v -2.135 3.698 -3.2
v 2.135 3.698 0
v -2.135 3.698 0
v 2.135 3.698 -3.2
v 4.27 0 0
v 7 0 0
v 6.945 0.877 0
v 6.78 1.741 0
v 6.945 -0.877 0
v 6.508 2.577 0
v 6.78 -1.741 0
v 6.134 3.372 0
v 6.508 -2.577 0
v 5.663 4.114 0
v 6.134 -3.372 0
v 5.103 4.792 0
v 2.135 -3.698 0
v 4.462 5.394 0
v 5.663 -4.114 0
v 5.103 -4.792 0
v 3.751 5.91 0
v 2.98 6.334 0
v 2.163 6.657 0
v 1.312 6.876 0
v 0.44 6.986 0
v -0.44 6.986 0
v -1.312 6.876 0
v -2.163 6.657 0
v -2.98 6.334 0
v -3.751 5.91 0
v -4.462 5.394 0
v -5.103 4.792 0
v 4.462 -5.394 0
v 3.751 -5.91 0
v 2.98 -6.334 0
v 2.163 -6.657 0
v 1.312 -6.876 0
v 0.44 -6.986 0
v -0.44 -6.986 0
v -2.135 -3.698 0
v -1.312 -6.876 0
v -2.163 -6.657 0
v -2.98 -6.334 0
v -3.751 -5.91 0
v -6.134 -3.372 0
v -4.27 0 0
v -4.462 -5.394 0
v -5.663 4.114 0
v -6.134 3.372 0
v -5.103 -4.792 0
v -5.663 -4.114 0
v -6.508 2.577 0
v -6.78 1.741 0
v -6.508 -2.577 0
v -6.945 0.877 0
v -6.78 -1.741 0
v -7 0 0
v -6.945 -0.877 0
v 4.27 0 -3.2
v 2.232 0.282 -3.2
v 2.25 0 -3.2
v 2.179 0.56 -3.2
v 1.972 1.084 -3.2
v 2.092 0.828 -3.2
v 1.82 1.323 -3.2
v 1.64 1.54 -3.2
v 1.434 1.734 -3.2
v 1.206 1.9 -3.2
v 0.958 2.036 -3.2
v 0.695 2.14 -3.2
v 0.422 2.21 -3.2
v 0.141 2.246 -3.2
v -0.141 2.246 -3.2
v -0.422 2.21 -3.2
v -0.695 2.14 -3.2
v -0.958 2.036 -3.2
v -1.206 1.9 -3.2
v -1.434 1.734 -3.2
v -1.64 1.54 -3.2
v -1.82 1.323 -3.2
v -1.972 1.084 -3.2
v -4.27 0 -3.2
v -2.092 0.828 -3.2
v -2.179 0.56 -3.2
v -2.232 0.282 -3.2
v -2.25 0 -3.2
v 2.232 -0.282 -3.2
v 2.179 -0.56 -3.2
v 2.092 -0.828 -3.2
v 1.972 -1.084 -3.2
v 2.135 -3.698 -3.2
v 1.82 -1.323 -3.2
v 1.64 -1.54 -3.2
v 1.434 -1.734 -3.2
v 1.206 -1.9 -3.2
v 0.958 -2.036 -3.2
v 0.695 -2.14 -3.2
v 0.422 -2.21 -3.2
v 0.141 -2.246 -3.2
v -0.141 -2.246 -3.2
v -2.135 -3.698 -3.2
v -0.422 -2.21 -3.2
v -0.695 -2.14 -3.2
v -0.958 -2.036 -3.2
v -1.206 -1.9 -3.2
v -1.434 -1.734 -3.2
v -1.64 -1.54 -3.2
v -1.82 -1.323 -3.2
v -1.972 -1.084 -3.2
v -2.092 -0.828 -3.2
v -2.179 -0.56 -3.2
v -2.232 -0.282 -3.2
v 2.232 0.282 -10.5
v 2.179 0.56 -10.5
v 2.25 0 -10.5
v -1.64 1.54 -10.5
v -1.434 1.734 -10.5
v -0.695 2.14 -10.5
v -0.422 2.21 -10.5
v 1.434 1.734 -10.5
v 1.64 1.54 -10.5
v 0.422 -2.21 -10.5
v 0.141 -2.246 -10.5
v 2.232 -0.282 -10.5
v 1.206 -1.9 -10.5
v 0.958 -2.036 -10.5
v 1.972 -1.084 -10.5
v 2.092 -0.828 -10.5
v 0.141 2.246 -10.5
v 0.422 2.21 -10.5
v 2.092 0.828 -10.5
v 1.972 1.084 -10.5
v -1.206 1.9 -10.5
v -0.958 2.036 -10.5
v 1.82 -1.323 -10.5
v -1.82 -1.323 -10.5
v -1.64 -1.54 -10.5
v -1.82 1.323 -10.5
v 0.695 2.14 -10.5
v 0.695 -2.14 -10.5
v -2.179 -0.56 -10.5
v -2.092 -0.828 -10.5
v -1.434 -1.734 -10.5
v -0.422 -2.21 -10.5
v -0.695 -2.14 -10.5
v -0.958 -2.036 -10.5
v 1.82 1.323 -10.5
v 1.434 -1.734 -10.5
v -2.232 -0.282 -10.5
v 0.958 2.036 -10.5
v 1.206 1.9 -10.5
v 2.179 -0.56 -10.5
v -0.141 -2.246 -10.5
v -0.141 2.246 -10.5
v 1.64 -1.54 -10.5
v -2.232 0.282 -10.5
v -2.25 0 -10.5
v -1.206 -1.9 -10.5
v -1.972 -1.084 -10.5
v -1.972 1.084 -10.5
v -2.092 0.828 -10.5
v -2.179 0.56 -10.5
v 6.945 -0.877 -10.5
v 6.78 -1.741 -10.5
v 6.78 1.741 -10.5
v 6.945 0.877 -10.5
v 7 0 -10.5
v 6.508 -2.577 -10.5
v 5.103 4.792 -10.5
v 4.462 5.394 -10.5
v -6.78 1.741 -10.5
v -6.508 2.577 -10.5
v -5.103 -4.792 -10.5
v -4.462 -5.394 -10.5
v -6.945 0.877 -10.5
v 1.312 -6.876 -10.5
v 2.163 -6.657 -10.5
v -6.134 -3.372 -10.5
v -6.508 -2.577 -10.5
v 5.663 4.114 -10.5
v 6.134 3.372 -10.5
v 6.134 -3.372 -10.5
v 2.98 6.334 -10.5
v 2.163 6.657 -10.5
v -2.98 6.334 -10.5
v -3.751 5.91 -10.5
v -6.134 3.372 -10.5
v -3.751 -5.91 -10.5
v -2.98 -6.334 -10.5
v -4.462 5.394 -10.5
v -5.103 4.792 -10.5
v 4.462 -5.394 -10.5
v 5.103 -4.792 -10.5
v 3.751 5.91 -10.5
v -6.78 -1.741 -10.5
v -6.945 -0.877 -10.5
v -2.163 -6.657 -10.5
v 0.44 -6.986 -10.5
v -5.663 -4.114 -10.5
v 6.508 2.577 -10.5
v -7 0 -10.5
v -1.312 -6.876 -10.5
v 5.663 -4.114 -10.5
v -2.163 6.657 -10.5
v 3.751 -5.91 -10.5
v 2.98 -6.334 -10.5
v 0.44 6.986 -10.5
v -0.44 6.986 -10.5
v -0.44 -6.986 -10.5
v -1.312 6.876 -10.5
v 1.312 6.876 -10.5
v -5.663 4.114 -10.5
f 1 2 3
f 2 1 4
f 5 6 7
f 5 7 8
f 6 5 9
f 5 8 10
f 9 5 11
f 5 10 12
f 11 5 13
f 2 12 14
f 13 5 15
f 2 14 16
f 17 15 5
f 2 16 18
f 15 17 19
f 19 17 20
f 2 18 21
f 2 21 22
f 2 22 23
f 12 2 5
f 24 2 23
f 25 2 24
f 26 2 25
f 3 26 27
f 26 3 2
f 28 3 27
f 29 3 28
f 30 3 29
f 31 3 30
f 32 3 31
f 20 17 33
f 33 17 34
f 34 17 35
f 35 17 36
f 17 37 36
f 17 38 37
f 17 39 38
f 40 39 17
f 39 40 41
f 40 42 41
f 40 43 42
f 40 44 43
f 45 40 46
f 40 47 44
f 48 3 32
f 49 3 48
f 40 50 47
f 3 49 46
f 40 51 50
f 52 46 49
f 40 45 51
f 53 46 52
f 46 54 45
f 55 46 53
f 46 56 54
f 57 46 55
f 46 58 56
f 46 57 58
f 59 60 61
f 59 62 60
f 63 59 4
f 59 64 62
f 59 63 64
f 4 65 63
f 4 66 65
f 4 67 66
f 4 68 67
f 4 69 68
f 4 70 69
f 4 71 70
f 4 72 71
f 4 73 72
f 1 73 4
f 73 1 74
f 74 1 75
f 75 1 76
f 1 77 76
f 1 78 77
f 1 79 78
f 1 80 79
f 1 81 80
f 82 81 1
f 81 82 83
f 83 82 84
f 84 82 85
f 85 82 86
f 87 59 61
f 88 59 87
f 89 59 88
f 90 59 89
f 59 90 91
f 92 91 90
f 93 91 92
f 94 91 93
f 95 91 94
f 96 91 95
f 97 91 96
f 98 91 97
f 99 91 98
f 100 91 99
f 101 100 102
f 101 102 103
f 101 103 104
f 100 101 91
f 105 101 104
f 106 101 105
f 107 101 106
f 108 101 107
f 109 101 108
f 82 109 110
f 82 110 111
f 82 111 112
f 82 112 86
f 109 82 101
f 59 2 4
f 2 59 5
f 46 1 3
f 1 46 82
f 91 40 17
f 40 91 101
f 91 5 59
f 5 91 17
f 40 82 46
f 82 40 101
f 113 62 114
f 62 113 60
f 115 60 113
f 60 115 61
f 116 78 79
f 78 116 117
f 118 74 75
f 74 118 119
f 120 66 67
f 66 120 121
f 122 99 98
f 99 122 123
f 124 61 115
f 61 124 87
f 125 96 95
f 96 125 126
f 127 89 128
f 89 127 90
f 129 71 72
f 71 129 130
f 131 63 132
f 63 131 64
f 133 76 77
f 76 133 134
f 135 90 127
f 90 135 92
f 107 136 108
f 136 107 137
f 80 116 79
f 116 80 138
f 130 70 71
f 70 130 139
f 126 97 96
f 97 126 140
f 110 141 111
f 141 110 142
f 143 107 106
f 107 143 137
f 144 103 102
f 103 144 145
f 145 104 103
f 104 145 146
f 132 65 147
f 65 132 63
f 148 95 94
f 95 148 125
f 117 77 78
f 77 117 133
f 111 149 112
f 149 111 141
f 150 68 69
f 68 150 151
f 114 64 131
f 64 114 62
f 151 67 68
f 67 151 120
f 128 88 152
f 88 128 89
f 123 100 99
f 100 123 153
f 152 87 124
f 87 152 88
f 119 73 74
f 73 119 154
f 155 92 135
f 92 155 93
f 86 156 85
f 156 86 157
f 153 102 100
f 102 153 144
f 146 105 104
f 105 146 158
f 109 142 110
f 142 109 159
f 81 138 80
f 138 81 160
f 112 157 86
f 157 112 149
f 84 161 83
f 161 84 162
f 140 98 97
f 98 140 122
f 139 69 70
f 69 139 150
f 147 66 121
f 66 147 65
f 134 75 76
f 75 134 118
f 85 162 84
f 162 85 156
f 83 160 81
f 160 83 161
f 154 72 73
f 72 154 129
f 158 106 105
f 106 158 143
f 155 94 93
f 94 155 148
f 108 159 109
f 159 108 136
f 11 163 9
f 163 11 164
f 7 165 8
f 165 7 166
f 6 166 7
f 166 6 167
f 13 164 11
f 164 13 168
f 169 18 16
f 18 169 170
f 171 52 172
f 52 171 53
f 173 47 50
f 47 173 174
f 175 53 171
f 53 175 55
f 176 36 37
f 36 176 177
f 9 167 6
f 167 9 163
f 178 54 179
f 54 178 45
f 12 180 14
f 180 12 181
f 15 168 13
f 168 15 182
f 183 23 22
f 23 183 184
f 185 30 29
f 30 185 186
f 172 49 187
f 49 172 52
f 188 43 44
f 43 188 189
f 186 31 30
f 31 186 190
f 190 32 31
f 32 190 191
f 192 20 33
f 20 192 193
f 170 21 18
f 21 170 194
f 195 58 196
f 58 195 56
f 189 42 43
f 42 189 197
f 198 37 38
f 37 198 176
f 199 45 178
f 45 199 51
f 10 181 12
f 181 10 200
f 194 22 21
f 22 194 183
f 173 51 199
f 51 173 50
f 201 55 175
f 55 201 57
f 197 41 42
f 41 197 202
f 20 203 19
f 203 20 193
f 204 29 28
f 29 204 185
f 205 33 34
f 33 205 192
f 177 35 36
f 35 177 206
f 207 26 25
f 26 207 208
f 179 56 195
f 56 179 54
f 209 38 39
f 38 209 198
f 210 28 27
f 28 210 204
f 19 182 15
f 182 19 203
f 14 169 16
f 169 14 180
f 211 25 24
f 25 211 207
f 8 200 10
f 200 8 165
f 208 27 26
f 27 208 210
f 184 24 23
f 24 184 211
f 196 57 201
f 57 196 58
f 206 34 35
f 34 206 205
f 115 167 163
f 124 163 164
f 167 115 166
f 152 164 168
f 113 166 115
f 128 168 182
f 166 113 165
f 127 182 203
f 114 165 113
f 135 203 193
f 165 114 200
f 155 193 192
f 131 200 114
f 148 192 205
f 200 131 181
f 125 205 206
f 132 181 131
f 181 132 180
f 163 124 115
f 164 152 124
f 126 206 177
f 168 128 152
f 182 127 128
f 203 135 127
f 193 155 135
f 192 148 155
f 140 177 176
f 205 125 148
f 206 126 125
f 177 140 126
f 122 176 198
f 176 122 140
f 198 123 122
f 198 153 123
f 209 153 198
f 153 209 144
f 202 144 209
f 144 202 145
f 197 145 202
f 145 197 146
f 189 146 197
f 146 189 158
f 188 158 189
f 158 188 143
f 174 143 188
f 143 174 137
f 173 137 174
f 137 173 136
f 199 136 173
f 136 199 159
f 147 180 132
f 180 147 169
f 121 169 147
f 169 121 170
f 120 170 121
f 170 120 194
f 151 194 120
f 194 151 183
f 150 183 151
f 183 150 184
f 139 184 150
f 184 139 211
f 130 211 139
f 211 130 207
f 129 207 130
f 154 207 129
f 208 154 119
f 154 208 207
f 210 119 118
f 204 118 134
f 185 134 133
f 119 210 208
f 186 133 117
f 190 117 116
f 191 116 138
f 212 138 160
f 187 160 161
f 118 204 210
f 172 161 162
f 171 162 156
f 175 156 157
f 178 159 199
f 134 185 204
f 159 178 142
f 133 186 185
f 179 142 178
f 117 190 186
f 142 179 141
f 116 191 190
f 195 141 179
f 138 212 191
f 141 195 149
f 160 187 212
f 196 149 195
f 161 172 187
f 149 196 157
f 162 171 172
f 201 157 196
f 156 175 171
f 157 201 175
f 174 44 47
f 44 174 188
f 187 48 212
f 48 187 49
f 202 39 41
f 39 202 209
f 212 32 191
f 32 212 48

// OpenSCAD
$fn = 50;


difference() {
	union() {
		translate(v = [0, 0, -10.5000000000]) {
			cylinder(h = 10.5000000000, r = 7.0000000000);
		}
	}
	union() {
		translate(v = [0, 0, 0]) {
			rotate(a = [0, 0, 0]) {
				difference() {
					union() {
						translate(v = [0, 0, -3.2000000000]) {
							linear_extrude(height = 3.2000000000) {
								polygon(points = [[4.2698000000, 0.0000000000], [2.1349000000, 3.6977552691], [-2.1349000000, 3.6977552691], [-4.2698000000, 0.0000000000], [-2.1349000000, -3.6977552691], [2.1349000000, -3.6977552691]]);
							}
						}
					}
					union();
				}
			}
		}
		#translate(v = [0, 0, -100.0000000000]) {
			cylinder(h = 200, r = 2.2500000000);
		}
	}
}
